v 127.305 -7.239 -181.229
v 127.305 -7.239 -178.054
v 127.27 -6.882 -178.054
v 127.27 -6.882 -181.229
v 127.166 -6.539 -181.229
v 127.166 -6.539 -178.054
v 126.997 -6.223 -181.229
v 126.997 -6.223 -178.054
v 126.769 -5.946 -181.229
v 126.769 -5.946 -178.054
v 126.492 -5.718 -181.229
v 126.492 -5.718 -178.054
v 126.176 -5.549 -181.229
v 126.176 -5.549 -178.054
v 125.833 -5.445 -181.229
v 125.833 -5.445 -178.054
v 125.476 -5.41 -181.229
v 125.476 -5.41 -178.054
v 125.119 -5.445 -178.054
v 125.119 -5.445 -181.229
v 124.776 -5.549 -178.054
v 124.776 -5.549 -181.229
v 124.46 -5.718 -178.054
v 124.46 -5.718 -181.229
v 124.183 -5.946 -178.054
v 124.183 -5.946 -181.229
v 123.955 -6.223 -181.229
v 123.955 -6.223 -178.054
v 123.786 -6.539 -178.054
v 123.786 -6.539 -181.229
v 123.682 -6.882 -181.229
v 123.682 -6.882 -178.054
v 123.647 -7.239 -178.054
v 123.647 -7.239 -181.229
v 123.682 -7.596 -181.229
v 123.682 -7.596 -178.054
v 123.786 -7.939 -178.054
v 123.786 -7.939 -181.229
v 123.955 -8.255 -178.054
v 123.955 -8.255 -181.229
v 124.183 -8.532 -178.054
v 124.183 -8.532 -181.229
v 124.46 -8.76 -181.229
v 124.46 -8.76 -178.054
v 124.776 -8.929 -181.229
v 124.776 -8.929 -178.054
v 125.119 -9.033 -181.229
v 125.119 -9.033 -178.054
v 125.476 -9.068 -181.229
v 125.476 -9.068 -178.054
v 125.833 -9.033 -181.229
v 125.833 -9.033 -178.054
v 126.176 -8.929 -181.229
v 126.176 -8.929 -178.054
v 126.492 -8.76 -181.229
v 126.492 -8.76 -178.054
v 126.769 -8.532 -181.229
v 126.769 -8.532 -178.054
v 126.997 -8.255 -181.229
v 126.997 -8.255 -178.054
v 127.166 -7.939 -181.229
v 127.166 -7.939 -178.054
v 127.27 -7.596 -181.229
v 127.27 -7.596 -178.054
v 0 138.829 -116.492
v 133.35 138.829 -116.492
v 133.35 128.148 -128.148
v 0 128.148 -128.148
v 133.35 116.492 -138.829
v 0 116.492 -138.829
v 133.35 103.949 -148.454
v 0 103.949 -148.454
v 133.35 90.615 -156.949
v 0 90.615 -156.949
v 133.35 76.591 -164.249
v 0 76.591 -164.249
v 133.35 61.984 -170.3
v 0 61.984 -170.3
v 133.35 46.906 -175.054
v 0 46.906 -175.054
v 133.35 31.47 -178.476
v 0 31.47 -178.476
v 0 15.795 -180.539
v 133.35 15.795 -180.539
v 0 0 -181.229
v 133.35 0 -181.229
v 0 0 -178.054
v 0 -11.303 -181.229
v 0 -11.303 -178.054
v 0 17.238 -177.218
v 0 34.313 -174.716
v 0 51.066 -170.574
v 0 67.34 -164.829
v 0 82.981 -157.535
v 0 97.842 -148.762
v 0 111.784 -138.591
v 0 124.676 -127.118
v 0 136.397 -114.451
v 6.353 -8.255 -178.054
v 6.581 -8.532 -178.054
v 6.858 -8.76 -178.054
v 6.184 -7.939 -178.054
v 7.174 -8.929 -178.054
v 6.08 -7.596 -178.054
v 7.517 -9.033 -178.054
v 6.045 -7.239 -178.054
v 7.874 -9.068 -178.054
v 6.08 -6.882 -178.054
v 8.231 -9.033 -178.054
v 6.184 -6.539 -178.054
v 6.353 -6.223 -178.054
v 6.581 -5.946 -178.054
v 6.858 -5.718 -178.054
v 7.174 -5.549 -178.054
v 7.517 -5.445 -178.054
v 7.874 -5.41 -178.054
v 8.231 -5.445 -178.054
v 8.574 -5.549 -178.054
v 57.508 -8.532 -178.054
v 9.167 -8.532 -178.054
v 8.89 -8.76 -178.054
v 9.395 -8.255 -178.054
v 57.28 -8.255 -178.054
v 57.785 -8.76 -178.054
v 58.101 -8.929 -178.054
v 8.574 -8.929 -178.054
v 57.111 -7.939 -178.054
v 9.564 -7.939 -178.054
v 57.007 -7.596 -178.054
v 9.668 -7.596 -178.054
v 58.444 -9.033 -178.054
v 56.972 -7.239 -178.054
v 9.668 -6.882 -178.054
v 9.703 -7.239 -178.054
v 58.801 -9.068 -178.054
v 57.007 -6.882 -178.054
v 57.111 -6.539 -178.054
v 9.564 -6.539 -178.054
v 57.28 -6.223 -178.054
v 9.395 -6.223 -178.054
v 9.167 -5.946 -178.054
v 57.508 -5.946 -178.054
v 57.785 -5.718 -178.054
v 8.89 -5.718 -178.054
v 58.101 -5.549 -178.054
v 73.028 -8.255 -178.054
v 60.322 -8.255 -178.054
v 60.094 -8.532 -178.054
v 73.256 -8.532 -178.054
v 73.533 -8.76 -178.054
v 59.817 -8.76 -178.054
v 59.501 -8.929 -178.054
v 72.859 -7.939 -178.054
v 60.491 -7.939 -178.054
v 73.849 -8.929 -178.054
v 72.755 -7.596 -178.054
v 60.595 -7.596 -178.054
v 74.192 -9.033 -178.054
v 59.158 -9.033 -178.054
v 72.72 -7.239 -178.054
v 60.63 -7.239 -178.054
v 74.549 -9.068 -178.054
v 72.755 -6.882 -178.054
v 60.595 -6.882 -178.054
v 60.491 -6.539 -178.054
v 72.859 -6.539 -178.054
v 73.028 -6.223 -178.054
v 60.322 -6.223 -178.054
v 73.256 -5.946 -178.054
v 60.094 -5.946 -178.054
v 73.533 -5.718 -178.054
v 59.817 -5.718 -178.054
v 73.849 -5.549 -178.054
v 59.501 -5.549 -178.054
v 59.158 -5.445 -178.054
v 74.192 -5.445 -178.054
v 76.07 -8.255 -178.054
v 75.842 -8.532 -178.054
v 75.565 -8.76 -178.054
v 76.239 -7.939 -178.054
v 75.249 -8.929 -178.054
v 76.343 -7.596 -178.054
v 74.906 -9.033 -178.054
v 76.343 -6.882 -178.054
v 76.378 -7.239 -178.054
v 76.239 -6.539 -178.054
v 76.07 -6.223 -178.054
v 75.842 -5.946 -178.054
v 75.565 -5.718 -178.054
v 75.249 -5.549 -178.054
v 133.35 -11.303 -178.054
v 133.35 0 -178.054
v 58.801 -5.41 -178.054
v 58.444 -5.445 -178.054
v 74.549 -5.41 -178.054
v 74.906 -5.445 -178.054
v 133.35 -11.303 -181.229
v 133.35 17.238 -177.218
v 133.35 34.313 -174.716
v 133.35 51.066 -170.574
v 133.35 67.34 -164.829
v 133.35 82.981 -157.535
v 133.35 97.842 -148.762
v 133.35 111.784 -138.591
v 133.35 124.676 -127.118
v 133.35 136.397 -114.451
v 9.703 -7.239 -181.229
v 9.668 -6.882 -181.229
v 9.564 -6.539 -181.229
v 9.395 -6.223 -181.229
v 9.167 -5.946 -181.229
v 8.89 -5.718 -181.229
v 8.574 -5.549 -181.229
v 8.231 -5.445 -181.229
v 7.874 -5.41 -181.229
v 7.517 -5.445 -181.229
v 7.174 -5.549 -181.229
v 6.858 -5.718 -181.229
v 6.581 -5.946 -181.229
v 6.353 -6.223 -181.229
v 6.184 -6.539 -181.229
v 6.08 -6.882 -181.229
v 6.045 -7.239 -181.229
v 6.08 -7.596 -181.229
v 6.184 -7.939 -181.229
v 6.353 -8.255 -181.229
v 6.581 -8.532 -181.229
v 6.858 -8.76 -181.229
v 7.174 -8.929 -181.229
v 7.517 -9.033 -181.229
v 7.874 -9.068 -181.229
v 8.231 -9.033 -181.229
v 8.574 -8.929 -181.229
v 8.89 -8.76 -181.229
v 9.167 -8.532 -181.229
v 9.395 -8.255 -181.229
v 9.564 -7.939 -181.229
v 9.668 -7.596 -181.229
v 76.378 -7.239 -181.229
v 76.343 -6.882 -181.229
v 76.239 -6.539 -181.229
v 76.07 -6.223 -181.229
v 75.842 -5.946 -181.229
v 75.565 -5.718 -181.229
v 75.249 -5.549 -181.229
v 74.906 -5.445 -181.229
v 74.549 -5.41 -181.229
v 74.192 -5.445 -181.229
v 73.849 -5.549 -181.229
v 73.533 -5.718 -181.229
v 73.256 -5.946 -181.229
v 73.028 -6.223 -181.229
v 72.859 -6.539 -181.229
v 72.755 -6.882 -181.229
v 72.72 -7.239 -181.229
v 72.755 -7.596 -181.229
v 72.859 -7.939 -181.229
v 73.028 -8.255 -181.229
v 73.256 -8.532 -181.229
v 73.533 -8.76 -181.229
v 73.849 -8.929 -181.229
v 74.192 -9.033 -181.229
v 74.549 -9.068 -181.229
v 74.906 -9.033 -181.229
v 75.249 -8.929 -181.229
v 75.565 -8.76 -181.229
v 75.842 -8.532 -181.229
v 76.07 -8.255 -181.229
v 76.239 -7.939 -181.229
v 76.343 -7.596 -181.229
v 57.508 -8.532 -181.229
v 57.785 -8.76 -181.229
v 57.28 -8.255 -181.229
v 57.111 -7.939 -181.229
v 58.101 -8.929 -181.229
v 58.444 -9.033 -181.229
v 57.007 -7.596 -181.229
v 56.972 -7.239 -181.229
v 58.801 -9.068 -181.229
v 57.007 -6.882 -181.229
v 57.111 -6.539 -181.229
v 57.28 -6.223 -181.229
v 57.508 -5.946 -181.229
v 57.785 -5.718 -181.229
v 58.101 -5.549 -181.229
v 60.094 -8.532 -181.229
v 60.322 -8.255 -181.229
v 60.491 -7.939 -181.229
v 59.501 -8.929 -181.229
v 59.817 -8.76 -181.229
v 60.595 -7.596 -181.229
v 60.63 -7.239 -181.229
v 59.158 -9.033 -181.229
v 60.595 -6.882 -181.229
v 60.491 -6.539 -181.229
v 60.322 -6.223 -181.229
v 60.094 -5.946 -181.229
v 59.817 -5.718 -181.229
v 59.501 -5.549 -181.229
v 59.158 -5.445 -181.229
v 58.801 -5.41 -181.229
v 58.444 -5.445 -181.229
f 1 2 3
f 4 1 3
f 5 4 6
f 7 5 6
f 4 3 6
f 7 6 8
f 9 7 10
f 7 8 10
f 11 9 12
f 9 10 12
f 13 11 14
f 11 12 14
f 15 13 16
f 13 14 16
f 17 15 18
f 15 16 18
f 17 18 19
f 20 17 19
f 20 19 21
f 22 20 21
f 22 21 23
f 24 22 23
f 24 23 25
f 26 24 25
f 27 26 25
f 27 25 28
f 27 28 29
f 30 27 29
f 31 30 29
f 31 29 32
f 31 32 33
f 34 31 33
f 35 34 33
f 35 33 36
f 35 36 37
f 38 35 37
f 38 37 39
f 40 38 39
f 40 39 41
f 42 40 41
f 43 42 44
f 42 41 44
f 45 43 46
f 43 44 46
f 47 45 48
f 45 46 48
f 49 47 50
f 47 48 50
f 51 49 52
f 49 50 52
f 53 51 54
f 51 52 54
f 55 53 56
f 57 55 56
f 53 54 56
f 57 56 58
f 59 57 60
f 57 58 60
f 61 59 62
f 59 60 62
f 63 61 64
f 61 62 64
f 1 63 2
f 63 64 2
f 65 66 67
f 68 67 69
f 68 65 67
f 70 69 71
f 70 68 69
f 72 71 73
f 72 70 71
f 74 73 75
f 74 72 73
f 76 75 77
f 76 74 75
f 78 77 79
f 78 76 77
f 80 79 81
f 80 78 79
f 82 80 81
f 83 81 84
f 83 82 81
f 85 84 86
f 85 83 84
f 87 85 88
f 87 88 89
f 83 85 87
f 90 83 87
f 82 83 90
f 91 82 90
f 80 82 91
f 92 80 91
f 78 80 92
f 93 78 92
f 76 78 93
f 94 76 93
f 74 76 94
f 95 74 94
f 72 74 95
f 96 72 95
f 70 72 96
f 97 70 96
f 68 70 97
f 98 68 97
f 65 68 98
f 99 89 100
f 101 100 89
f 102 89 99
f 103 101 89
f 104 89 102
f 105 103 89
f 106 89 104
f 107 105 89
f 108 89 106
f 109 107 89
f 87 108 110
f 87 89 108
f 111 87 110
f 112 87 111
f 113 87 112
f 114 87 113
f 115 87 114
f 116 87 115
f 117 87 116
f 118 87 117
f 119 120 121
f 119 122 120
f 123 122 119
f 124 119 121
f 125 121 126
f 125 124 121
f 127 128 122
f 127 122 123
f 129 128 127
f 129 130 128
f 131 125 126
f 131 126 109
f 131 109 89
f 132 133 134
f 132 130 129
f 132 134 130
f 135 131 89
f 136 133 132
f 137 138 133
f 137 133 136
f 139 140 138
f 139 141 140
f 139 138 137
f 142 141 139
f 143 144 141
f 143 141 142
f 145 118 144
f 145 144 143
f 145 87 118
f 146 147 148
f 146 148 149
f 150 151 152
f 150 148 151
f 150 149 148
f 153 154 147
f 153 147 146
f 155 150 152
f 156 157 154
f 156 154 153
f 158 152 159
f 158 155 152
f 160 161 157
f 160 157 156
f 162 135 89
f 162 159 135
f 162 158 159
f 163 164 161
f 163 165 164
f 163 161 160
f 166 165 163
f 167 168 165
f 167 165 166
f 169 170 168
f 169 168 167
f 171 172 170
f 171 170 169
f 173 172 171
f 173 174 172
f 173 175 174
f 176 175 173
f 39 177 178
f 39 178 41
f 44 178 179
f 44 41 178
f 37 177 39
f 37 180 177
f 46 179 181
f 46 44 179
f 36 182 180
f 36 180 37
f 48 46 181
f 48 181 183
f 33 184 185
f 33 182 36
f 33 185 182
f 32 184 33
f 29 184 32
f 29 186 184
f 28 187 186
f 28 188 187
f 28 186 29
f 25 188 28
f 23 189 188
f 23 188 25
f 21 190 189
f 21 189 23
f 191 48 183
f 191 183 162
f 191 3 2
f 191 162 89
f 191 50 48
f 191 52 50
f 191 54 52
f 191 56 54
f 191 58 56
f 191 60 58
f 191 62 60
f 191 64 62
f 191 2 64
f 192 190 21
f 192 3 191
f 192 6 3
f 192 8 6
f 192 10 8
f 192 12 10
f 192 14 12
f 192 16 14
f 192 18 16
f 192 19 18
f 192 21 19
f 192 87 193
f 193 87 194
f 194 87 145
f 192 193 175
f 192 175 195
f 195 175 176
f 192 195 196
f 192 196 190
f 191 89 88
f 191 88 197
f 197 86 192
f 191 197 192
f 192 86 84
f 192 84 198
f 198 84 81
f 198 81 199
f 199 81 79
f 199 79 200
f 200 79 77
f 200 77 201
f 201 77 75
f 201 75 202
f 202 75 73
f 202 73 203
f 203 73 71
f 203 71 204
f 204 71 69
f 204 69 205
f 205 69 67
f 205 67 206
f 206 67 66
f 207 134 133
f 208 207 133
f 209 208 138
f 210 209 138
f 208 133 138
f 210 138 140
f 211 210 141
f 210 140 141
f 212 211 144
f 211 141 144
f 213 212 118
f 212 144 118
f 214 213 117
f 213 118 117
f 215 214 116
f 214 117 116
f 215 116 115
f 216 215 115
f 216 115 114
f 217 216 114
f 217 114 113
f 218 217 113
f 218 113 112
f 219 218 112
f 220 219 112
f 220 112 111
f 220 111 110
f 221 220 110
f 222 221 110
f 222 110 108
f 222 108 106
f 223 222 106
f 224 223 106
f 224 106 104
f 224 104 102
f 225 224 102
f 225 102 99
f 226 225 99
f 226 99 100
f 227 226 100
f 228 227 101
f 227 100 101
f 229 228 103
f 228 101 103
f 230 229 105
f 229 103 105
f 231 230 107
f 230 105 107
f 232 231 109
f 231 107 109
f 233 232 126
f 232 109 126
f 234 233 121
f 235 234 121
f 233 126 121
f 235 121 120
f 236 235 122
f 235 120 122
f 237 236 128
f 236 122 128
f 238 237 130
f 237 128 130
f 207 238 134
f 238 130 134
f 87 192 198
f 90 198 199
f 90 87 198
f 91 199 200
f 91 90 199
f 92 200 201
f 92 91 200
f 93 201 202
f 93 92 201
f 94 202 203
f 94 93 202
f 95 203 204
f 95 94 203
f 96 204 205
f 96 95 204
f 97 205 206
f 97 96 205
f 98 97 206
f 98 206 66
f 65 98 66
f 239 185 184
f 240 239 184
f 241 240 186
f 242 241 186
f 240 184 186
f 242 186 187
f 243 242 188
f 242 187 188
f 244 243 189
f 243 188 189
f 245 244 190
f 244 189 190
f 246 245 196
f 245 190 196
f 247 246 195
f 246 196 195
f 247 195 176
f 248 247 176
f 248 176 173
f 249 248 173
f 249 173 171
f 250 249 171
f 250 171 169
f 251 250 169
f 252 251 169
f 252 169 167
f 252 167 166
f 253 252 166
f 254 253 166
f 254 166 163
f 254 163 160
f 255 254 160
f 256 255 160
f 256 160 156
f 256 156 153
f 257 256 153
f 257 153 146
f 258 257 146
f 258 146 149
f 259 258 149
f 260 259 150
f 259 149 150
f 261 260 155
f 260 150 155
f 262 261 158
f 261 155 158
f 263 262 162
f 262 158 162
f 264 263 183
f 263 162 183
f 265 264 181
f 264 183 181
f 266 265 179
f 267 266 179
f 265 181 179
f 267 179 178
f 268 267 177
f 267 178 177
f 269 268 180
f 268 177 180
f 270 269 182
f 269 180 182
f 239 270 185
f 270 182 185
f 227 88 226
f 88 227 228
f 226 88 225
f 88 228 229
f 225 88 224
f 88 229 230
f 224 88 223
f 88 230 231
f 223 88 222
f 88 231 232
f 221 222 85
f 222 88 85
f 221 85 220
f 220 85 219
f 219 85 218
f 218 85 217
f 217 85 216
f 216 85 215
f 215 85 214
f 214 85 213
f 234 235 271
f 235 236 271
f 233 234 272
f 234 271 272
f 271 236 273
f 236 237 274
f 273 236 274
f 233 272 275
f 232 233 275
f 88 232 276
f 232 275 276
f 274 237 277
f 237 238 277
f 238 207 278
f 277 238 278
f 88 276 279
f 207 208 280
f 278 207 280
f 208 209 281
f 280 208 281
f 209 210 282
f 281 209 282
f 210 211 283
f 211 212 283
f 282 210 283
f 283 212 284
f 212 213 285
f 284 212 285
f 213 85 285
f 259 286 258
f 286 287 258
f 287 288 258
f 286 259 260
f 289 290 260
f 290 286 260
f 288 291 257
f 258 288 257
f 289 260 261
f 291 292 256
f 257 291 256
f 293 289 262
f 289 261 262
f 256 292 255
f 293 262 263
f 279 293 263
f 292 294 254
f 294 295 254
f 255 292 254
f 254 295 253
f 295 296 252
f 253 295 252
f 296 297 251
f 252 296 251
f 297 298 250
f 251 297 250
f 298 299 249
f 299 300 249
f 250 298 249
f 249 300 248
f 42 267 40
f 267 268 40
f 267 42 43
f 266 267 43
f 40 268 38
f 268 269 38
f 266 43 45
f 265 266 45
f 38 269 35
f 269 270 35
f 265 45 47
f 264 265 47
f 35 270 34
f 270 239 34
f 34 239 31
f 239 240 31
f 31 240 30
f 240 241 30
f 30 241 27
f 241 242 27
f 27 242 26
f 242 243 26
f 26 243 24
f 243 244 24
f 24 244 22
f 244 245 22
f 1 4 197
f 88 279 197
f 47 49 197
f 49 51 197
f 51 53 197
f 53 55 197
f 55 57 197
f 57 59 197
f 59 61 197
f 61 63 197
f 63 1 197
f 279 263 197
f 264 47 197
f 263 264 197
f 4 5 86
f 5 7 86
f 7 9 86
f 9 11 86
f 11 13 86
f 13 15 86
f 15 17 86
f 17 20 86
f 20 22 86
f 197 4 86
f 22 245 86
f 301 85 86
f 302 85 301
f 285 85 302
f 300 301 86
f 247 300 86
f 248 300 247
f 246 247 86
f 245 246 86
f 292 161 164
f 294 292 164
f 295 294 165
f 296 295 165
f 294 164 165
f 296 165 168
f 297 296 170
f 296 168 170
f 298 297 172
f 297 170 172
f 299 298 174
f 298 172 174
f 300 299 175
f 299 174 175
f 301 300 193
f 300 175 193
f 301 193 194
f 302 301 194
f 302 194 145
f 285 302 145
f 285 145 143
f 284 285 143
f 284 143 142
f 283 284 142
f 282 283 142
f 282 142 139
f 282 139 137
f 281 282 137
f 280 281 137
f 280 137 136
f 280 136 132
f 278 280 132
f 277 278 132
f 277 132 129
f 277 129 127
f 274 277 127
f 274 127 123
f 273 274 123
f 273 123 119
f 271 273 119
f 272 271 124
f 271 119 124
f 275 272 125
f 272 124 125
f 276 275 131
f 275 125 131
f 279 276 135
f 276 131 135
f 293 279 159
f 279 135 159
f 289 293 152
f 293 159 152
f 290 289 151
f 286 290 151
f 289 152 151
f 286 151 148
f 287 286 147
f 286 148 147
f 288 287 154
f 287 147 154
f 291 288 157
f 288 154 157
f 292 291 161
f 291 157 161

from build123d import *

# Parameters (mm, degrees)
BOSS_EXTRUDE1_DEPTH = 133.35
CUT_EXTRUDE1_DEPTH  = 134.35
SKETCH3_W           = 133.35
SKETCH3_H           = 3.175
BOSS_EXTRUDE2_DEPTH = 11.303
SKETCH4_R           = 1.8288
CUT_EXTRUDE2_DEPTH  = 4.175


with BuildPart() as part:
    # Sketch1 → Boss-Extrude1 (new body)
    with BuildSketch(Plane(origin=(0, 0, 0), x_dir=(0, 0, -1), z_dir=(1, 0, 0))):
        with BuildLine():
            Line((0, 178.054), (0, 181.229))
            ThreePointArc((0, 181.229), (128.148254848, 128.148254848), (181.229, 0))
            Line((181.229, 0), (178.054, 0))
            ThreePointArc((178.054, 0), (125.903190817, 125.903190817), (0, 178.054))
        make_face()
    extrude(amount=BOSS_EXTRUDE1_DEPTH)

    # Sketch2 → Cut-Extrude1 (cut, through all)
    with BuildSketch(Plane(origin=(133.35, 0, 0), x_dir=(0, 0, -1), z_dir=(1, 0, 0))):
        with BuildLine():
            Line((114.450905055, 136.397277275), (116.491755716, 138.829468382))
            ThreePointArc((116.491755716, 138.829468382), (61.983968555, 170.299553972), (0, 181.229))
            Line((0, 181.229), (0, 178.054))
            ThreePointArc((0, 178.054), (60.8980546, 167.316029901), (114.450905055, 136.397277275))
        make_face()
    extrude(amount=-CUT_EXTRUDE1_DEPTH, mode=Mode.SUBTRACT)

    # Sketch3 → Boss-Extrude2 (add)
    with BuildSketch(Plane.XZ):
        with Locations((66.675, -179.6415)):
            Rectangle(SKETCH3_W, SKETCH3_H)
    extrude(amount=BOSS_EXTRUDE2_DEPTH)

    # Sketch4 → Cut-Extrude2 (cut, through all)
    with BuildSketch(Plane.XY.offset(-178.054)):
        with Locations((7.874, -7.239)):
            Circle(SKETCH4_R)
        with Locations((58.801, -7.239)):
            Circle(SKETCH4_R)
        with Locations((74.549, -7.239)):
            Circle(SKETCH4_R)
        with Locations((125.476, -7.239)):
            Circle(SKETCH4_R)
    extrude(amount=-CUT_EXTRUDE2_DEPTH, mode=Mode.SUBTRACT)


solid = part.part
